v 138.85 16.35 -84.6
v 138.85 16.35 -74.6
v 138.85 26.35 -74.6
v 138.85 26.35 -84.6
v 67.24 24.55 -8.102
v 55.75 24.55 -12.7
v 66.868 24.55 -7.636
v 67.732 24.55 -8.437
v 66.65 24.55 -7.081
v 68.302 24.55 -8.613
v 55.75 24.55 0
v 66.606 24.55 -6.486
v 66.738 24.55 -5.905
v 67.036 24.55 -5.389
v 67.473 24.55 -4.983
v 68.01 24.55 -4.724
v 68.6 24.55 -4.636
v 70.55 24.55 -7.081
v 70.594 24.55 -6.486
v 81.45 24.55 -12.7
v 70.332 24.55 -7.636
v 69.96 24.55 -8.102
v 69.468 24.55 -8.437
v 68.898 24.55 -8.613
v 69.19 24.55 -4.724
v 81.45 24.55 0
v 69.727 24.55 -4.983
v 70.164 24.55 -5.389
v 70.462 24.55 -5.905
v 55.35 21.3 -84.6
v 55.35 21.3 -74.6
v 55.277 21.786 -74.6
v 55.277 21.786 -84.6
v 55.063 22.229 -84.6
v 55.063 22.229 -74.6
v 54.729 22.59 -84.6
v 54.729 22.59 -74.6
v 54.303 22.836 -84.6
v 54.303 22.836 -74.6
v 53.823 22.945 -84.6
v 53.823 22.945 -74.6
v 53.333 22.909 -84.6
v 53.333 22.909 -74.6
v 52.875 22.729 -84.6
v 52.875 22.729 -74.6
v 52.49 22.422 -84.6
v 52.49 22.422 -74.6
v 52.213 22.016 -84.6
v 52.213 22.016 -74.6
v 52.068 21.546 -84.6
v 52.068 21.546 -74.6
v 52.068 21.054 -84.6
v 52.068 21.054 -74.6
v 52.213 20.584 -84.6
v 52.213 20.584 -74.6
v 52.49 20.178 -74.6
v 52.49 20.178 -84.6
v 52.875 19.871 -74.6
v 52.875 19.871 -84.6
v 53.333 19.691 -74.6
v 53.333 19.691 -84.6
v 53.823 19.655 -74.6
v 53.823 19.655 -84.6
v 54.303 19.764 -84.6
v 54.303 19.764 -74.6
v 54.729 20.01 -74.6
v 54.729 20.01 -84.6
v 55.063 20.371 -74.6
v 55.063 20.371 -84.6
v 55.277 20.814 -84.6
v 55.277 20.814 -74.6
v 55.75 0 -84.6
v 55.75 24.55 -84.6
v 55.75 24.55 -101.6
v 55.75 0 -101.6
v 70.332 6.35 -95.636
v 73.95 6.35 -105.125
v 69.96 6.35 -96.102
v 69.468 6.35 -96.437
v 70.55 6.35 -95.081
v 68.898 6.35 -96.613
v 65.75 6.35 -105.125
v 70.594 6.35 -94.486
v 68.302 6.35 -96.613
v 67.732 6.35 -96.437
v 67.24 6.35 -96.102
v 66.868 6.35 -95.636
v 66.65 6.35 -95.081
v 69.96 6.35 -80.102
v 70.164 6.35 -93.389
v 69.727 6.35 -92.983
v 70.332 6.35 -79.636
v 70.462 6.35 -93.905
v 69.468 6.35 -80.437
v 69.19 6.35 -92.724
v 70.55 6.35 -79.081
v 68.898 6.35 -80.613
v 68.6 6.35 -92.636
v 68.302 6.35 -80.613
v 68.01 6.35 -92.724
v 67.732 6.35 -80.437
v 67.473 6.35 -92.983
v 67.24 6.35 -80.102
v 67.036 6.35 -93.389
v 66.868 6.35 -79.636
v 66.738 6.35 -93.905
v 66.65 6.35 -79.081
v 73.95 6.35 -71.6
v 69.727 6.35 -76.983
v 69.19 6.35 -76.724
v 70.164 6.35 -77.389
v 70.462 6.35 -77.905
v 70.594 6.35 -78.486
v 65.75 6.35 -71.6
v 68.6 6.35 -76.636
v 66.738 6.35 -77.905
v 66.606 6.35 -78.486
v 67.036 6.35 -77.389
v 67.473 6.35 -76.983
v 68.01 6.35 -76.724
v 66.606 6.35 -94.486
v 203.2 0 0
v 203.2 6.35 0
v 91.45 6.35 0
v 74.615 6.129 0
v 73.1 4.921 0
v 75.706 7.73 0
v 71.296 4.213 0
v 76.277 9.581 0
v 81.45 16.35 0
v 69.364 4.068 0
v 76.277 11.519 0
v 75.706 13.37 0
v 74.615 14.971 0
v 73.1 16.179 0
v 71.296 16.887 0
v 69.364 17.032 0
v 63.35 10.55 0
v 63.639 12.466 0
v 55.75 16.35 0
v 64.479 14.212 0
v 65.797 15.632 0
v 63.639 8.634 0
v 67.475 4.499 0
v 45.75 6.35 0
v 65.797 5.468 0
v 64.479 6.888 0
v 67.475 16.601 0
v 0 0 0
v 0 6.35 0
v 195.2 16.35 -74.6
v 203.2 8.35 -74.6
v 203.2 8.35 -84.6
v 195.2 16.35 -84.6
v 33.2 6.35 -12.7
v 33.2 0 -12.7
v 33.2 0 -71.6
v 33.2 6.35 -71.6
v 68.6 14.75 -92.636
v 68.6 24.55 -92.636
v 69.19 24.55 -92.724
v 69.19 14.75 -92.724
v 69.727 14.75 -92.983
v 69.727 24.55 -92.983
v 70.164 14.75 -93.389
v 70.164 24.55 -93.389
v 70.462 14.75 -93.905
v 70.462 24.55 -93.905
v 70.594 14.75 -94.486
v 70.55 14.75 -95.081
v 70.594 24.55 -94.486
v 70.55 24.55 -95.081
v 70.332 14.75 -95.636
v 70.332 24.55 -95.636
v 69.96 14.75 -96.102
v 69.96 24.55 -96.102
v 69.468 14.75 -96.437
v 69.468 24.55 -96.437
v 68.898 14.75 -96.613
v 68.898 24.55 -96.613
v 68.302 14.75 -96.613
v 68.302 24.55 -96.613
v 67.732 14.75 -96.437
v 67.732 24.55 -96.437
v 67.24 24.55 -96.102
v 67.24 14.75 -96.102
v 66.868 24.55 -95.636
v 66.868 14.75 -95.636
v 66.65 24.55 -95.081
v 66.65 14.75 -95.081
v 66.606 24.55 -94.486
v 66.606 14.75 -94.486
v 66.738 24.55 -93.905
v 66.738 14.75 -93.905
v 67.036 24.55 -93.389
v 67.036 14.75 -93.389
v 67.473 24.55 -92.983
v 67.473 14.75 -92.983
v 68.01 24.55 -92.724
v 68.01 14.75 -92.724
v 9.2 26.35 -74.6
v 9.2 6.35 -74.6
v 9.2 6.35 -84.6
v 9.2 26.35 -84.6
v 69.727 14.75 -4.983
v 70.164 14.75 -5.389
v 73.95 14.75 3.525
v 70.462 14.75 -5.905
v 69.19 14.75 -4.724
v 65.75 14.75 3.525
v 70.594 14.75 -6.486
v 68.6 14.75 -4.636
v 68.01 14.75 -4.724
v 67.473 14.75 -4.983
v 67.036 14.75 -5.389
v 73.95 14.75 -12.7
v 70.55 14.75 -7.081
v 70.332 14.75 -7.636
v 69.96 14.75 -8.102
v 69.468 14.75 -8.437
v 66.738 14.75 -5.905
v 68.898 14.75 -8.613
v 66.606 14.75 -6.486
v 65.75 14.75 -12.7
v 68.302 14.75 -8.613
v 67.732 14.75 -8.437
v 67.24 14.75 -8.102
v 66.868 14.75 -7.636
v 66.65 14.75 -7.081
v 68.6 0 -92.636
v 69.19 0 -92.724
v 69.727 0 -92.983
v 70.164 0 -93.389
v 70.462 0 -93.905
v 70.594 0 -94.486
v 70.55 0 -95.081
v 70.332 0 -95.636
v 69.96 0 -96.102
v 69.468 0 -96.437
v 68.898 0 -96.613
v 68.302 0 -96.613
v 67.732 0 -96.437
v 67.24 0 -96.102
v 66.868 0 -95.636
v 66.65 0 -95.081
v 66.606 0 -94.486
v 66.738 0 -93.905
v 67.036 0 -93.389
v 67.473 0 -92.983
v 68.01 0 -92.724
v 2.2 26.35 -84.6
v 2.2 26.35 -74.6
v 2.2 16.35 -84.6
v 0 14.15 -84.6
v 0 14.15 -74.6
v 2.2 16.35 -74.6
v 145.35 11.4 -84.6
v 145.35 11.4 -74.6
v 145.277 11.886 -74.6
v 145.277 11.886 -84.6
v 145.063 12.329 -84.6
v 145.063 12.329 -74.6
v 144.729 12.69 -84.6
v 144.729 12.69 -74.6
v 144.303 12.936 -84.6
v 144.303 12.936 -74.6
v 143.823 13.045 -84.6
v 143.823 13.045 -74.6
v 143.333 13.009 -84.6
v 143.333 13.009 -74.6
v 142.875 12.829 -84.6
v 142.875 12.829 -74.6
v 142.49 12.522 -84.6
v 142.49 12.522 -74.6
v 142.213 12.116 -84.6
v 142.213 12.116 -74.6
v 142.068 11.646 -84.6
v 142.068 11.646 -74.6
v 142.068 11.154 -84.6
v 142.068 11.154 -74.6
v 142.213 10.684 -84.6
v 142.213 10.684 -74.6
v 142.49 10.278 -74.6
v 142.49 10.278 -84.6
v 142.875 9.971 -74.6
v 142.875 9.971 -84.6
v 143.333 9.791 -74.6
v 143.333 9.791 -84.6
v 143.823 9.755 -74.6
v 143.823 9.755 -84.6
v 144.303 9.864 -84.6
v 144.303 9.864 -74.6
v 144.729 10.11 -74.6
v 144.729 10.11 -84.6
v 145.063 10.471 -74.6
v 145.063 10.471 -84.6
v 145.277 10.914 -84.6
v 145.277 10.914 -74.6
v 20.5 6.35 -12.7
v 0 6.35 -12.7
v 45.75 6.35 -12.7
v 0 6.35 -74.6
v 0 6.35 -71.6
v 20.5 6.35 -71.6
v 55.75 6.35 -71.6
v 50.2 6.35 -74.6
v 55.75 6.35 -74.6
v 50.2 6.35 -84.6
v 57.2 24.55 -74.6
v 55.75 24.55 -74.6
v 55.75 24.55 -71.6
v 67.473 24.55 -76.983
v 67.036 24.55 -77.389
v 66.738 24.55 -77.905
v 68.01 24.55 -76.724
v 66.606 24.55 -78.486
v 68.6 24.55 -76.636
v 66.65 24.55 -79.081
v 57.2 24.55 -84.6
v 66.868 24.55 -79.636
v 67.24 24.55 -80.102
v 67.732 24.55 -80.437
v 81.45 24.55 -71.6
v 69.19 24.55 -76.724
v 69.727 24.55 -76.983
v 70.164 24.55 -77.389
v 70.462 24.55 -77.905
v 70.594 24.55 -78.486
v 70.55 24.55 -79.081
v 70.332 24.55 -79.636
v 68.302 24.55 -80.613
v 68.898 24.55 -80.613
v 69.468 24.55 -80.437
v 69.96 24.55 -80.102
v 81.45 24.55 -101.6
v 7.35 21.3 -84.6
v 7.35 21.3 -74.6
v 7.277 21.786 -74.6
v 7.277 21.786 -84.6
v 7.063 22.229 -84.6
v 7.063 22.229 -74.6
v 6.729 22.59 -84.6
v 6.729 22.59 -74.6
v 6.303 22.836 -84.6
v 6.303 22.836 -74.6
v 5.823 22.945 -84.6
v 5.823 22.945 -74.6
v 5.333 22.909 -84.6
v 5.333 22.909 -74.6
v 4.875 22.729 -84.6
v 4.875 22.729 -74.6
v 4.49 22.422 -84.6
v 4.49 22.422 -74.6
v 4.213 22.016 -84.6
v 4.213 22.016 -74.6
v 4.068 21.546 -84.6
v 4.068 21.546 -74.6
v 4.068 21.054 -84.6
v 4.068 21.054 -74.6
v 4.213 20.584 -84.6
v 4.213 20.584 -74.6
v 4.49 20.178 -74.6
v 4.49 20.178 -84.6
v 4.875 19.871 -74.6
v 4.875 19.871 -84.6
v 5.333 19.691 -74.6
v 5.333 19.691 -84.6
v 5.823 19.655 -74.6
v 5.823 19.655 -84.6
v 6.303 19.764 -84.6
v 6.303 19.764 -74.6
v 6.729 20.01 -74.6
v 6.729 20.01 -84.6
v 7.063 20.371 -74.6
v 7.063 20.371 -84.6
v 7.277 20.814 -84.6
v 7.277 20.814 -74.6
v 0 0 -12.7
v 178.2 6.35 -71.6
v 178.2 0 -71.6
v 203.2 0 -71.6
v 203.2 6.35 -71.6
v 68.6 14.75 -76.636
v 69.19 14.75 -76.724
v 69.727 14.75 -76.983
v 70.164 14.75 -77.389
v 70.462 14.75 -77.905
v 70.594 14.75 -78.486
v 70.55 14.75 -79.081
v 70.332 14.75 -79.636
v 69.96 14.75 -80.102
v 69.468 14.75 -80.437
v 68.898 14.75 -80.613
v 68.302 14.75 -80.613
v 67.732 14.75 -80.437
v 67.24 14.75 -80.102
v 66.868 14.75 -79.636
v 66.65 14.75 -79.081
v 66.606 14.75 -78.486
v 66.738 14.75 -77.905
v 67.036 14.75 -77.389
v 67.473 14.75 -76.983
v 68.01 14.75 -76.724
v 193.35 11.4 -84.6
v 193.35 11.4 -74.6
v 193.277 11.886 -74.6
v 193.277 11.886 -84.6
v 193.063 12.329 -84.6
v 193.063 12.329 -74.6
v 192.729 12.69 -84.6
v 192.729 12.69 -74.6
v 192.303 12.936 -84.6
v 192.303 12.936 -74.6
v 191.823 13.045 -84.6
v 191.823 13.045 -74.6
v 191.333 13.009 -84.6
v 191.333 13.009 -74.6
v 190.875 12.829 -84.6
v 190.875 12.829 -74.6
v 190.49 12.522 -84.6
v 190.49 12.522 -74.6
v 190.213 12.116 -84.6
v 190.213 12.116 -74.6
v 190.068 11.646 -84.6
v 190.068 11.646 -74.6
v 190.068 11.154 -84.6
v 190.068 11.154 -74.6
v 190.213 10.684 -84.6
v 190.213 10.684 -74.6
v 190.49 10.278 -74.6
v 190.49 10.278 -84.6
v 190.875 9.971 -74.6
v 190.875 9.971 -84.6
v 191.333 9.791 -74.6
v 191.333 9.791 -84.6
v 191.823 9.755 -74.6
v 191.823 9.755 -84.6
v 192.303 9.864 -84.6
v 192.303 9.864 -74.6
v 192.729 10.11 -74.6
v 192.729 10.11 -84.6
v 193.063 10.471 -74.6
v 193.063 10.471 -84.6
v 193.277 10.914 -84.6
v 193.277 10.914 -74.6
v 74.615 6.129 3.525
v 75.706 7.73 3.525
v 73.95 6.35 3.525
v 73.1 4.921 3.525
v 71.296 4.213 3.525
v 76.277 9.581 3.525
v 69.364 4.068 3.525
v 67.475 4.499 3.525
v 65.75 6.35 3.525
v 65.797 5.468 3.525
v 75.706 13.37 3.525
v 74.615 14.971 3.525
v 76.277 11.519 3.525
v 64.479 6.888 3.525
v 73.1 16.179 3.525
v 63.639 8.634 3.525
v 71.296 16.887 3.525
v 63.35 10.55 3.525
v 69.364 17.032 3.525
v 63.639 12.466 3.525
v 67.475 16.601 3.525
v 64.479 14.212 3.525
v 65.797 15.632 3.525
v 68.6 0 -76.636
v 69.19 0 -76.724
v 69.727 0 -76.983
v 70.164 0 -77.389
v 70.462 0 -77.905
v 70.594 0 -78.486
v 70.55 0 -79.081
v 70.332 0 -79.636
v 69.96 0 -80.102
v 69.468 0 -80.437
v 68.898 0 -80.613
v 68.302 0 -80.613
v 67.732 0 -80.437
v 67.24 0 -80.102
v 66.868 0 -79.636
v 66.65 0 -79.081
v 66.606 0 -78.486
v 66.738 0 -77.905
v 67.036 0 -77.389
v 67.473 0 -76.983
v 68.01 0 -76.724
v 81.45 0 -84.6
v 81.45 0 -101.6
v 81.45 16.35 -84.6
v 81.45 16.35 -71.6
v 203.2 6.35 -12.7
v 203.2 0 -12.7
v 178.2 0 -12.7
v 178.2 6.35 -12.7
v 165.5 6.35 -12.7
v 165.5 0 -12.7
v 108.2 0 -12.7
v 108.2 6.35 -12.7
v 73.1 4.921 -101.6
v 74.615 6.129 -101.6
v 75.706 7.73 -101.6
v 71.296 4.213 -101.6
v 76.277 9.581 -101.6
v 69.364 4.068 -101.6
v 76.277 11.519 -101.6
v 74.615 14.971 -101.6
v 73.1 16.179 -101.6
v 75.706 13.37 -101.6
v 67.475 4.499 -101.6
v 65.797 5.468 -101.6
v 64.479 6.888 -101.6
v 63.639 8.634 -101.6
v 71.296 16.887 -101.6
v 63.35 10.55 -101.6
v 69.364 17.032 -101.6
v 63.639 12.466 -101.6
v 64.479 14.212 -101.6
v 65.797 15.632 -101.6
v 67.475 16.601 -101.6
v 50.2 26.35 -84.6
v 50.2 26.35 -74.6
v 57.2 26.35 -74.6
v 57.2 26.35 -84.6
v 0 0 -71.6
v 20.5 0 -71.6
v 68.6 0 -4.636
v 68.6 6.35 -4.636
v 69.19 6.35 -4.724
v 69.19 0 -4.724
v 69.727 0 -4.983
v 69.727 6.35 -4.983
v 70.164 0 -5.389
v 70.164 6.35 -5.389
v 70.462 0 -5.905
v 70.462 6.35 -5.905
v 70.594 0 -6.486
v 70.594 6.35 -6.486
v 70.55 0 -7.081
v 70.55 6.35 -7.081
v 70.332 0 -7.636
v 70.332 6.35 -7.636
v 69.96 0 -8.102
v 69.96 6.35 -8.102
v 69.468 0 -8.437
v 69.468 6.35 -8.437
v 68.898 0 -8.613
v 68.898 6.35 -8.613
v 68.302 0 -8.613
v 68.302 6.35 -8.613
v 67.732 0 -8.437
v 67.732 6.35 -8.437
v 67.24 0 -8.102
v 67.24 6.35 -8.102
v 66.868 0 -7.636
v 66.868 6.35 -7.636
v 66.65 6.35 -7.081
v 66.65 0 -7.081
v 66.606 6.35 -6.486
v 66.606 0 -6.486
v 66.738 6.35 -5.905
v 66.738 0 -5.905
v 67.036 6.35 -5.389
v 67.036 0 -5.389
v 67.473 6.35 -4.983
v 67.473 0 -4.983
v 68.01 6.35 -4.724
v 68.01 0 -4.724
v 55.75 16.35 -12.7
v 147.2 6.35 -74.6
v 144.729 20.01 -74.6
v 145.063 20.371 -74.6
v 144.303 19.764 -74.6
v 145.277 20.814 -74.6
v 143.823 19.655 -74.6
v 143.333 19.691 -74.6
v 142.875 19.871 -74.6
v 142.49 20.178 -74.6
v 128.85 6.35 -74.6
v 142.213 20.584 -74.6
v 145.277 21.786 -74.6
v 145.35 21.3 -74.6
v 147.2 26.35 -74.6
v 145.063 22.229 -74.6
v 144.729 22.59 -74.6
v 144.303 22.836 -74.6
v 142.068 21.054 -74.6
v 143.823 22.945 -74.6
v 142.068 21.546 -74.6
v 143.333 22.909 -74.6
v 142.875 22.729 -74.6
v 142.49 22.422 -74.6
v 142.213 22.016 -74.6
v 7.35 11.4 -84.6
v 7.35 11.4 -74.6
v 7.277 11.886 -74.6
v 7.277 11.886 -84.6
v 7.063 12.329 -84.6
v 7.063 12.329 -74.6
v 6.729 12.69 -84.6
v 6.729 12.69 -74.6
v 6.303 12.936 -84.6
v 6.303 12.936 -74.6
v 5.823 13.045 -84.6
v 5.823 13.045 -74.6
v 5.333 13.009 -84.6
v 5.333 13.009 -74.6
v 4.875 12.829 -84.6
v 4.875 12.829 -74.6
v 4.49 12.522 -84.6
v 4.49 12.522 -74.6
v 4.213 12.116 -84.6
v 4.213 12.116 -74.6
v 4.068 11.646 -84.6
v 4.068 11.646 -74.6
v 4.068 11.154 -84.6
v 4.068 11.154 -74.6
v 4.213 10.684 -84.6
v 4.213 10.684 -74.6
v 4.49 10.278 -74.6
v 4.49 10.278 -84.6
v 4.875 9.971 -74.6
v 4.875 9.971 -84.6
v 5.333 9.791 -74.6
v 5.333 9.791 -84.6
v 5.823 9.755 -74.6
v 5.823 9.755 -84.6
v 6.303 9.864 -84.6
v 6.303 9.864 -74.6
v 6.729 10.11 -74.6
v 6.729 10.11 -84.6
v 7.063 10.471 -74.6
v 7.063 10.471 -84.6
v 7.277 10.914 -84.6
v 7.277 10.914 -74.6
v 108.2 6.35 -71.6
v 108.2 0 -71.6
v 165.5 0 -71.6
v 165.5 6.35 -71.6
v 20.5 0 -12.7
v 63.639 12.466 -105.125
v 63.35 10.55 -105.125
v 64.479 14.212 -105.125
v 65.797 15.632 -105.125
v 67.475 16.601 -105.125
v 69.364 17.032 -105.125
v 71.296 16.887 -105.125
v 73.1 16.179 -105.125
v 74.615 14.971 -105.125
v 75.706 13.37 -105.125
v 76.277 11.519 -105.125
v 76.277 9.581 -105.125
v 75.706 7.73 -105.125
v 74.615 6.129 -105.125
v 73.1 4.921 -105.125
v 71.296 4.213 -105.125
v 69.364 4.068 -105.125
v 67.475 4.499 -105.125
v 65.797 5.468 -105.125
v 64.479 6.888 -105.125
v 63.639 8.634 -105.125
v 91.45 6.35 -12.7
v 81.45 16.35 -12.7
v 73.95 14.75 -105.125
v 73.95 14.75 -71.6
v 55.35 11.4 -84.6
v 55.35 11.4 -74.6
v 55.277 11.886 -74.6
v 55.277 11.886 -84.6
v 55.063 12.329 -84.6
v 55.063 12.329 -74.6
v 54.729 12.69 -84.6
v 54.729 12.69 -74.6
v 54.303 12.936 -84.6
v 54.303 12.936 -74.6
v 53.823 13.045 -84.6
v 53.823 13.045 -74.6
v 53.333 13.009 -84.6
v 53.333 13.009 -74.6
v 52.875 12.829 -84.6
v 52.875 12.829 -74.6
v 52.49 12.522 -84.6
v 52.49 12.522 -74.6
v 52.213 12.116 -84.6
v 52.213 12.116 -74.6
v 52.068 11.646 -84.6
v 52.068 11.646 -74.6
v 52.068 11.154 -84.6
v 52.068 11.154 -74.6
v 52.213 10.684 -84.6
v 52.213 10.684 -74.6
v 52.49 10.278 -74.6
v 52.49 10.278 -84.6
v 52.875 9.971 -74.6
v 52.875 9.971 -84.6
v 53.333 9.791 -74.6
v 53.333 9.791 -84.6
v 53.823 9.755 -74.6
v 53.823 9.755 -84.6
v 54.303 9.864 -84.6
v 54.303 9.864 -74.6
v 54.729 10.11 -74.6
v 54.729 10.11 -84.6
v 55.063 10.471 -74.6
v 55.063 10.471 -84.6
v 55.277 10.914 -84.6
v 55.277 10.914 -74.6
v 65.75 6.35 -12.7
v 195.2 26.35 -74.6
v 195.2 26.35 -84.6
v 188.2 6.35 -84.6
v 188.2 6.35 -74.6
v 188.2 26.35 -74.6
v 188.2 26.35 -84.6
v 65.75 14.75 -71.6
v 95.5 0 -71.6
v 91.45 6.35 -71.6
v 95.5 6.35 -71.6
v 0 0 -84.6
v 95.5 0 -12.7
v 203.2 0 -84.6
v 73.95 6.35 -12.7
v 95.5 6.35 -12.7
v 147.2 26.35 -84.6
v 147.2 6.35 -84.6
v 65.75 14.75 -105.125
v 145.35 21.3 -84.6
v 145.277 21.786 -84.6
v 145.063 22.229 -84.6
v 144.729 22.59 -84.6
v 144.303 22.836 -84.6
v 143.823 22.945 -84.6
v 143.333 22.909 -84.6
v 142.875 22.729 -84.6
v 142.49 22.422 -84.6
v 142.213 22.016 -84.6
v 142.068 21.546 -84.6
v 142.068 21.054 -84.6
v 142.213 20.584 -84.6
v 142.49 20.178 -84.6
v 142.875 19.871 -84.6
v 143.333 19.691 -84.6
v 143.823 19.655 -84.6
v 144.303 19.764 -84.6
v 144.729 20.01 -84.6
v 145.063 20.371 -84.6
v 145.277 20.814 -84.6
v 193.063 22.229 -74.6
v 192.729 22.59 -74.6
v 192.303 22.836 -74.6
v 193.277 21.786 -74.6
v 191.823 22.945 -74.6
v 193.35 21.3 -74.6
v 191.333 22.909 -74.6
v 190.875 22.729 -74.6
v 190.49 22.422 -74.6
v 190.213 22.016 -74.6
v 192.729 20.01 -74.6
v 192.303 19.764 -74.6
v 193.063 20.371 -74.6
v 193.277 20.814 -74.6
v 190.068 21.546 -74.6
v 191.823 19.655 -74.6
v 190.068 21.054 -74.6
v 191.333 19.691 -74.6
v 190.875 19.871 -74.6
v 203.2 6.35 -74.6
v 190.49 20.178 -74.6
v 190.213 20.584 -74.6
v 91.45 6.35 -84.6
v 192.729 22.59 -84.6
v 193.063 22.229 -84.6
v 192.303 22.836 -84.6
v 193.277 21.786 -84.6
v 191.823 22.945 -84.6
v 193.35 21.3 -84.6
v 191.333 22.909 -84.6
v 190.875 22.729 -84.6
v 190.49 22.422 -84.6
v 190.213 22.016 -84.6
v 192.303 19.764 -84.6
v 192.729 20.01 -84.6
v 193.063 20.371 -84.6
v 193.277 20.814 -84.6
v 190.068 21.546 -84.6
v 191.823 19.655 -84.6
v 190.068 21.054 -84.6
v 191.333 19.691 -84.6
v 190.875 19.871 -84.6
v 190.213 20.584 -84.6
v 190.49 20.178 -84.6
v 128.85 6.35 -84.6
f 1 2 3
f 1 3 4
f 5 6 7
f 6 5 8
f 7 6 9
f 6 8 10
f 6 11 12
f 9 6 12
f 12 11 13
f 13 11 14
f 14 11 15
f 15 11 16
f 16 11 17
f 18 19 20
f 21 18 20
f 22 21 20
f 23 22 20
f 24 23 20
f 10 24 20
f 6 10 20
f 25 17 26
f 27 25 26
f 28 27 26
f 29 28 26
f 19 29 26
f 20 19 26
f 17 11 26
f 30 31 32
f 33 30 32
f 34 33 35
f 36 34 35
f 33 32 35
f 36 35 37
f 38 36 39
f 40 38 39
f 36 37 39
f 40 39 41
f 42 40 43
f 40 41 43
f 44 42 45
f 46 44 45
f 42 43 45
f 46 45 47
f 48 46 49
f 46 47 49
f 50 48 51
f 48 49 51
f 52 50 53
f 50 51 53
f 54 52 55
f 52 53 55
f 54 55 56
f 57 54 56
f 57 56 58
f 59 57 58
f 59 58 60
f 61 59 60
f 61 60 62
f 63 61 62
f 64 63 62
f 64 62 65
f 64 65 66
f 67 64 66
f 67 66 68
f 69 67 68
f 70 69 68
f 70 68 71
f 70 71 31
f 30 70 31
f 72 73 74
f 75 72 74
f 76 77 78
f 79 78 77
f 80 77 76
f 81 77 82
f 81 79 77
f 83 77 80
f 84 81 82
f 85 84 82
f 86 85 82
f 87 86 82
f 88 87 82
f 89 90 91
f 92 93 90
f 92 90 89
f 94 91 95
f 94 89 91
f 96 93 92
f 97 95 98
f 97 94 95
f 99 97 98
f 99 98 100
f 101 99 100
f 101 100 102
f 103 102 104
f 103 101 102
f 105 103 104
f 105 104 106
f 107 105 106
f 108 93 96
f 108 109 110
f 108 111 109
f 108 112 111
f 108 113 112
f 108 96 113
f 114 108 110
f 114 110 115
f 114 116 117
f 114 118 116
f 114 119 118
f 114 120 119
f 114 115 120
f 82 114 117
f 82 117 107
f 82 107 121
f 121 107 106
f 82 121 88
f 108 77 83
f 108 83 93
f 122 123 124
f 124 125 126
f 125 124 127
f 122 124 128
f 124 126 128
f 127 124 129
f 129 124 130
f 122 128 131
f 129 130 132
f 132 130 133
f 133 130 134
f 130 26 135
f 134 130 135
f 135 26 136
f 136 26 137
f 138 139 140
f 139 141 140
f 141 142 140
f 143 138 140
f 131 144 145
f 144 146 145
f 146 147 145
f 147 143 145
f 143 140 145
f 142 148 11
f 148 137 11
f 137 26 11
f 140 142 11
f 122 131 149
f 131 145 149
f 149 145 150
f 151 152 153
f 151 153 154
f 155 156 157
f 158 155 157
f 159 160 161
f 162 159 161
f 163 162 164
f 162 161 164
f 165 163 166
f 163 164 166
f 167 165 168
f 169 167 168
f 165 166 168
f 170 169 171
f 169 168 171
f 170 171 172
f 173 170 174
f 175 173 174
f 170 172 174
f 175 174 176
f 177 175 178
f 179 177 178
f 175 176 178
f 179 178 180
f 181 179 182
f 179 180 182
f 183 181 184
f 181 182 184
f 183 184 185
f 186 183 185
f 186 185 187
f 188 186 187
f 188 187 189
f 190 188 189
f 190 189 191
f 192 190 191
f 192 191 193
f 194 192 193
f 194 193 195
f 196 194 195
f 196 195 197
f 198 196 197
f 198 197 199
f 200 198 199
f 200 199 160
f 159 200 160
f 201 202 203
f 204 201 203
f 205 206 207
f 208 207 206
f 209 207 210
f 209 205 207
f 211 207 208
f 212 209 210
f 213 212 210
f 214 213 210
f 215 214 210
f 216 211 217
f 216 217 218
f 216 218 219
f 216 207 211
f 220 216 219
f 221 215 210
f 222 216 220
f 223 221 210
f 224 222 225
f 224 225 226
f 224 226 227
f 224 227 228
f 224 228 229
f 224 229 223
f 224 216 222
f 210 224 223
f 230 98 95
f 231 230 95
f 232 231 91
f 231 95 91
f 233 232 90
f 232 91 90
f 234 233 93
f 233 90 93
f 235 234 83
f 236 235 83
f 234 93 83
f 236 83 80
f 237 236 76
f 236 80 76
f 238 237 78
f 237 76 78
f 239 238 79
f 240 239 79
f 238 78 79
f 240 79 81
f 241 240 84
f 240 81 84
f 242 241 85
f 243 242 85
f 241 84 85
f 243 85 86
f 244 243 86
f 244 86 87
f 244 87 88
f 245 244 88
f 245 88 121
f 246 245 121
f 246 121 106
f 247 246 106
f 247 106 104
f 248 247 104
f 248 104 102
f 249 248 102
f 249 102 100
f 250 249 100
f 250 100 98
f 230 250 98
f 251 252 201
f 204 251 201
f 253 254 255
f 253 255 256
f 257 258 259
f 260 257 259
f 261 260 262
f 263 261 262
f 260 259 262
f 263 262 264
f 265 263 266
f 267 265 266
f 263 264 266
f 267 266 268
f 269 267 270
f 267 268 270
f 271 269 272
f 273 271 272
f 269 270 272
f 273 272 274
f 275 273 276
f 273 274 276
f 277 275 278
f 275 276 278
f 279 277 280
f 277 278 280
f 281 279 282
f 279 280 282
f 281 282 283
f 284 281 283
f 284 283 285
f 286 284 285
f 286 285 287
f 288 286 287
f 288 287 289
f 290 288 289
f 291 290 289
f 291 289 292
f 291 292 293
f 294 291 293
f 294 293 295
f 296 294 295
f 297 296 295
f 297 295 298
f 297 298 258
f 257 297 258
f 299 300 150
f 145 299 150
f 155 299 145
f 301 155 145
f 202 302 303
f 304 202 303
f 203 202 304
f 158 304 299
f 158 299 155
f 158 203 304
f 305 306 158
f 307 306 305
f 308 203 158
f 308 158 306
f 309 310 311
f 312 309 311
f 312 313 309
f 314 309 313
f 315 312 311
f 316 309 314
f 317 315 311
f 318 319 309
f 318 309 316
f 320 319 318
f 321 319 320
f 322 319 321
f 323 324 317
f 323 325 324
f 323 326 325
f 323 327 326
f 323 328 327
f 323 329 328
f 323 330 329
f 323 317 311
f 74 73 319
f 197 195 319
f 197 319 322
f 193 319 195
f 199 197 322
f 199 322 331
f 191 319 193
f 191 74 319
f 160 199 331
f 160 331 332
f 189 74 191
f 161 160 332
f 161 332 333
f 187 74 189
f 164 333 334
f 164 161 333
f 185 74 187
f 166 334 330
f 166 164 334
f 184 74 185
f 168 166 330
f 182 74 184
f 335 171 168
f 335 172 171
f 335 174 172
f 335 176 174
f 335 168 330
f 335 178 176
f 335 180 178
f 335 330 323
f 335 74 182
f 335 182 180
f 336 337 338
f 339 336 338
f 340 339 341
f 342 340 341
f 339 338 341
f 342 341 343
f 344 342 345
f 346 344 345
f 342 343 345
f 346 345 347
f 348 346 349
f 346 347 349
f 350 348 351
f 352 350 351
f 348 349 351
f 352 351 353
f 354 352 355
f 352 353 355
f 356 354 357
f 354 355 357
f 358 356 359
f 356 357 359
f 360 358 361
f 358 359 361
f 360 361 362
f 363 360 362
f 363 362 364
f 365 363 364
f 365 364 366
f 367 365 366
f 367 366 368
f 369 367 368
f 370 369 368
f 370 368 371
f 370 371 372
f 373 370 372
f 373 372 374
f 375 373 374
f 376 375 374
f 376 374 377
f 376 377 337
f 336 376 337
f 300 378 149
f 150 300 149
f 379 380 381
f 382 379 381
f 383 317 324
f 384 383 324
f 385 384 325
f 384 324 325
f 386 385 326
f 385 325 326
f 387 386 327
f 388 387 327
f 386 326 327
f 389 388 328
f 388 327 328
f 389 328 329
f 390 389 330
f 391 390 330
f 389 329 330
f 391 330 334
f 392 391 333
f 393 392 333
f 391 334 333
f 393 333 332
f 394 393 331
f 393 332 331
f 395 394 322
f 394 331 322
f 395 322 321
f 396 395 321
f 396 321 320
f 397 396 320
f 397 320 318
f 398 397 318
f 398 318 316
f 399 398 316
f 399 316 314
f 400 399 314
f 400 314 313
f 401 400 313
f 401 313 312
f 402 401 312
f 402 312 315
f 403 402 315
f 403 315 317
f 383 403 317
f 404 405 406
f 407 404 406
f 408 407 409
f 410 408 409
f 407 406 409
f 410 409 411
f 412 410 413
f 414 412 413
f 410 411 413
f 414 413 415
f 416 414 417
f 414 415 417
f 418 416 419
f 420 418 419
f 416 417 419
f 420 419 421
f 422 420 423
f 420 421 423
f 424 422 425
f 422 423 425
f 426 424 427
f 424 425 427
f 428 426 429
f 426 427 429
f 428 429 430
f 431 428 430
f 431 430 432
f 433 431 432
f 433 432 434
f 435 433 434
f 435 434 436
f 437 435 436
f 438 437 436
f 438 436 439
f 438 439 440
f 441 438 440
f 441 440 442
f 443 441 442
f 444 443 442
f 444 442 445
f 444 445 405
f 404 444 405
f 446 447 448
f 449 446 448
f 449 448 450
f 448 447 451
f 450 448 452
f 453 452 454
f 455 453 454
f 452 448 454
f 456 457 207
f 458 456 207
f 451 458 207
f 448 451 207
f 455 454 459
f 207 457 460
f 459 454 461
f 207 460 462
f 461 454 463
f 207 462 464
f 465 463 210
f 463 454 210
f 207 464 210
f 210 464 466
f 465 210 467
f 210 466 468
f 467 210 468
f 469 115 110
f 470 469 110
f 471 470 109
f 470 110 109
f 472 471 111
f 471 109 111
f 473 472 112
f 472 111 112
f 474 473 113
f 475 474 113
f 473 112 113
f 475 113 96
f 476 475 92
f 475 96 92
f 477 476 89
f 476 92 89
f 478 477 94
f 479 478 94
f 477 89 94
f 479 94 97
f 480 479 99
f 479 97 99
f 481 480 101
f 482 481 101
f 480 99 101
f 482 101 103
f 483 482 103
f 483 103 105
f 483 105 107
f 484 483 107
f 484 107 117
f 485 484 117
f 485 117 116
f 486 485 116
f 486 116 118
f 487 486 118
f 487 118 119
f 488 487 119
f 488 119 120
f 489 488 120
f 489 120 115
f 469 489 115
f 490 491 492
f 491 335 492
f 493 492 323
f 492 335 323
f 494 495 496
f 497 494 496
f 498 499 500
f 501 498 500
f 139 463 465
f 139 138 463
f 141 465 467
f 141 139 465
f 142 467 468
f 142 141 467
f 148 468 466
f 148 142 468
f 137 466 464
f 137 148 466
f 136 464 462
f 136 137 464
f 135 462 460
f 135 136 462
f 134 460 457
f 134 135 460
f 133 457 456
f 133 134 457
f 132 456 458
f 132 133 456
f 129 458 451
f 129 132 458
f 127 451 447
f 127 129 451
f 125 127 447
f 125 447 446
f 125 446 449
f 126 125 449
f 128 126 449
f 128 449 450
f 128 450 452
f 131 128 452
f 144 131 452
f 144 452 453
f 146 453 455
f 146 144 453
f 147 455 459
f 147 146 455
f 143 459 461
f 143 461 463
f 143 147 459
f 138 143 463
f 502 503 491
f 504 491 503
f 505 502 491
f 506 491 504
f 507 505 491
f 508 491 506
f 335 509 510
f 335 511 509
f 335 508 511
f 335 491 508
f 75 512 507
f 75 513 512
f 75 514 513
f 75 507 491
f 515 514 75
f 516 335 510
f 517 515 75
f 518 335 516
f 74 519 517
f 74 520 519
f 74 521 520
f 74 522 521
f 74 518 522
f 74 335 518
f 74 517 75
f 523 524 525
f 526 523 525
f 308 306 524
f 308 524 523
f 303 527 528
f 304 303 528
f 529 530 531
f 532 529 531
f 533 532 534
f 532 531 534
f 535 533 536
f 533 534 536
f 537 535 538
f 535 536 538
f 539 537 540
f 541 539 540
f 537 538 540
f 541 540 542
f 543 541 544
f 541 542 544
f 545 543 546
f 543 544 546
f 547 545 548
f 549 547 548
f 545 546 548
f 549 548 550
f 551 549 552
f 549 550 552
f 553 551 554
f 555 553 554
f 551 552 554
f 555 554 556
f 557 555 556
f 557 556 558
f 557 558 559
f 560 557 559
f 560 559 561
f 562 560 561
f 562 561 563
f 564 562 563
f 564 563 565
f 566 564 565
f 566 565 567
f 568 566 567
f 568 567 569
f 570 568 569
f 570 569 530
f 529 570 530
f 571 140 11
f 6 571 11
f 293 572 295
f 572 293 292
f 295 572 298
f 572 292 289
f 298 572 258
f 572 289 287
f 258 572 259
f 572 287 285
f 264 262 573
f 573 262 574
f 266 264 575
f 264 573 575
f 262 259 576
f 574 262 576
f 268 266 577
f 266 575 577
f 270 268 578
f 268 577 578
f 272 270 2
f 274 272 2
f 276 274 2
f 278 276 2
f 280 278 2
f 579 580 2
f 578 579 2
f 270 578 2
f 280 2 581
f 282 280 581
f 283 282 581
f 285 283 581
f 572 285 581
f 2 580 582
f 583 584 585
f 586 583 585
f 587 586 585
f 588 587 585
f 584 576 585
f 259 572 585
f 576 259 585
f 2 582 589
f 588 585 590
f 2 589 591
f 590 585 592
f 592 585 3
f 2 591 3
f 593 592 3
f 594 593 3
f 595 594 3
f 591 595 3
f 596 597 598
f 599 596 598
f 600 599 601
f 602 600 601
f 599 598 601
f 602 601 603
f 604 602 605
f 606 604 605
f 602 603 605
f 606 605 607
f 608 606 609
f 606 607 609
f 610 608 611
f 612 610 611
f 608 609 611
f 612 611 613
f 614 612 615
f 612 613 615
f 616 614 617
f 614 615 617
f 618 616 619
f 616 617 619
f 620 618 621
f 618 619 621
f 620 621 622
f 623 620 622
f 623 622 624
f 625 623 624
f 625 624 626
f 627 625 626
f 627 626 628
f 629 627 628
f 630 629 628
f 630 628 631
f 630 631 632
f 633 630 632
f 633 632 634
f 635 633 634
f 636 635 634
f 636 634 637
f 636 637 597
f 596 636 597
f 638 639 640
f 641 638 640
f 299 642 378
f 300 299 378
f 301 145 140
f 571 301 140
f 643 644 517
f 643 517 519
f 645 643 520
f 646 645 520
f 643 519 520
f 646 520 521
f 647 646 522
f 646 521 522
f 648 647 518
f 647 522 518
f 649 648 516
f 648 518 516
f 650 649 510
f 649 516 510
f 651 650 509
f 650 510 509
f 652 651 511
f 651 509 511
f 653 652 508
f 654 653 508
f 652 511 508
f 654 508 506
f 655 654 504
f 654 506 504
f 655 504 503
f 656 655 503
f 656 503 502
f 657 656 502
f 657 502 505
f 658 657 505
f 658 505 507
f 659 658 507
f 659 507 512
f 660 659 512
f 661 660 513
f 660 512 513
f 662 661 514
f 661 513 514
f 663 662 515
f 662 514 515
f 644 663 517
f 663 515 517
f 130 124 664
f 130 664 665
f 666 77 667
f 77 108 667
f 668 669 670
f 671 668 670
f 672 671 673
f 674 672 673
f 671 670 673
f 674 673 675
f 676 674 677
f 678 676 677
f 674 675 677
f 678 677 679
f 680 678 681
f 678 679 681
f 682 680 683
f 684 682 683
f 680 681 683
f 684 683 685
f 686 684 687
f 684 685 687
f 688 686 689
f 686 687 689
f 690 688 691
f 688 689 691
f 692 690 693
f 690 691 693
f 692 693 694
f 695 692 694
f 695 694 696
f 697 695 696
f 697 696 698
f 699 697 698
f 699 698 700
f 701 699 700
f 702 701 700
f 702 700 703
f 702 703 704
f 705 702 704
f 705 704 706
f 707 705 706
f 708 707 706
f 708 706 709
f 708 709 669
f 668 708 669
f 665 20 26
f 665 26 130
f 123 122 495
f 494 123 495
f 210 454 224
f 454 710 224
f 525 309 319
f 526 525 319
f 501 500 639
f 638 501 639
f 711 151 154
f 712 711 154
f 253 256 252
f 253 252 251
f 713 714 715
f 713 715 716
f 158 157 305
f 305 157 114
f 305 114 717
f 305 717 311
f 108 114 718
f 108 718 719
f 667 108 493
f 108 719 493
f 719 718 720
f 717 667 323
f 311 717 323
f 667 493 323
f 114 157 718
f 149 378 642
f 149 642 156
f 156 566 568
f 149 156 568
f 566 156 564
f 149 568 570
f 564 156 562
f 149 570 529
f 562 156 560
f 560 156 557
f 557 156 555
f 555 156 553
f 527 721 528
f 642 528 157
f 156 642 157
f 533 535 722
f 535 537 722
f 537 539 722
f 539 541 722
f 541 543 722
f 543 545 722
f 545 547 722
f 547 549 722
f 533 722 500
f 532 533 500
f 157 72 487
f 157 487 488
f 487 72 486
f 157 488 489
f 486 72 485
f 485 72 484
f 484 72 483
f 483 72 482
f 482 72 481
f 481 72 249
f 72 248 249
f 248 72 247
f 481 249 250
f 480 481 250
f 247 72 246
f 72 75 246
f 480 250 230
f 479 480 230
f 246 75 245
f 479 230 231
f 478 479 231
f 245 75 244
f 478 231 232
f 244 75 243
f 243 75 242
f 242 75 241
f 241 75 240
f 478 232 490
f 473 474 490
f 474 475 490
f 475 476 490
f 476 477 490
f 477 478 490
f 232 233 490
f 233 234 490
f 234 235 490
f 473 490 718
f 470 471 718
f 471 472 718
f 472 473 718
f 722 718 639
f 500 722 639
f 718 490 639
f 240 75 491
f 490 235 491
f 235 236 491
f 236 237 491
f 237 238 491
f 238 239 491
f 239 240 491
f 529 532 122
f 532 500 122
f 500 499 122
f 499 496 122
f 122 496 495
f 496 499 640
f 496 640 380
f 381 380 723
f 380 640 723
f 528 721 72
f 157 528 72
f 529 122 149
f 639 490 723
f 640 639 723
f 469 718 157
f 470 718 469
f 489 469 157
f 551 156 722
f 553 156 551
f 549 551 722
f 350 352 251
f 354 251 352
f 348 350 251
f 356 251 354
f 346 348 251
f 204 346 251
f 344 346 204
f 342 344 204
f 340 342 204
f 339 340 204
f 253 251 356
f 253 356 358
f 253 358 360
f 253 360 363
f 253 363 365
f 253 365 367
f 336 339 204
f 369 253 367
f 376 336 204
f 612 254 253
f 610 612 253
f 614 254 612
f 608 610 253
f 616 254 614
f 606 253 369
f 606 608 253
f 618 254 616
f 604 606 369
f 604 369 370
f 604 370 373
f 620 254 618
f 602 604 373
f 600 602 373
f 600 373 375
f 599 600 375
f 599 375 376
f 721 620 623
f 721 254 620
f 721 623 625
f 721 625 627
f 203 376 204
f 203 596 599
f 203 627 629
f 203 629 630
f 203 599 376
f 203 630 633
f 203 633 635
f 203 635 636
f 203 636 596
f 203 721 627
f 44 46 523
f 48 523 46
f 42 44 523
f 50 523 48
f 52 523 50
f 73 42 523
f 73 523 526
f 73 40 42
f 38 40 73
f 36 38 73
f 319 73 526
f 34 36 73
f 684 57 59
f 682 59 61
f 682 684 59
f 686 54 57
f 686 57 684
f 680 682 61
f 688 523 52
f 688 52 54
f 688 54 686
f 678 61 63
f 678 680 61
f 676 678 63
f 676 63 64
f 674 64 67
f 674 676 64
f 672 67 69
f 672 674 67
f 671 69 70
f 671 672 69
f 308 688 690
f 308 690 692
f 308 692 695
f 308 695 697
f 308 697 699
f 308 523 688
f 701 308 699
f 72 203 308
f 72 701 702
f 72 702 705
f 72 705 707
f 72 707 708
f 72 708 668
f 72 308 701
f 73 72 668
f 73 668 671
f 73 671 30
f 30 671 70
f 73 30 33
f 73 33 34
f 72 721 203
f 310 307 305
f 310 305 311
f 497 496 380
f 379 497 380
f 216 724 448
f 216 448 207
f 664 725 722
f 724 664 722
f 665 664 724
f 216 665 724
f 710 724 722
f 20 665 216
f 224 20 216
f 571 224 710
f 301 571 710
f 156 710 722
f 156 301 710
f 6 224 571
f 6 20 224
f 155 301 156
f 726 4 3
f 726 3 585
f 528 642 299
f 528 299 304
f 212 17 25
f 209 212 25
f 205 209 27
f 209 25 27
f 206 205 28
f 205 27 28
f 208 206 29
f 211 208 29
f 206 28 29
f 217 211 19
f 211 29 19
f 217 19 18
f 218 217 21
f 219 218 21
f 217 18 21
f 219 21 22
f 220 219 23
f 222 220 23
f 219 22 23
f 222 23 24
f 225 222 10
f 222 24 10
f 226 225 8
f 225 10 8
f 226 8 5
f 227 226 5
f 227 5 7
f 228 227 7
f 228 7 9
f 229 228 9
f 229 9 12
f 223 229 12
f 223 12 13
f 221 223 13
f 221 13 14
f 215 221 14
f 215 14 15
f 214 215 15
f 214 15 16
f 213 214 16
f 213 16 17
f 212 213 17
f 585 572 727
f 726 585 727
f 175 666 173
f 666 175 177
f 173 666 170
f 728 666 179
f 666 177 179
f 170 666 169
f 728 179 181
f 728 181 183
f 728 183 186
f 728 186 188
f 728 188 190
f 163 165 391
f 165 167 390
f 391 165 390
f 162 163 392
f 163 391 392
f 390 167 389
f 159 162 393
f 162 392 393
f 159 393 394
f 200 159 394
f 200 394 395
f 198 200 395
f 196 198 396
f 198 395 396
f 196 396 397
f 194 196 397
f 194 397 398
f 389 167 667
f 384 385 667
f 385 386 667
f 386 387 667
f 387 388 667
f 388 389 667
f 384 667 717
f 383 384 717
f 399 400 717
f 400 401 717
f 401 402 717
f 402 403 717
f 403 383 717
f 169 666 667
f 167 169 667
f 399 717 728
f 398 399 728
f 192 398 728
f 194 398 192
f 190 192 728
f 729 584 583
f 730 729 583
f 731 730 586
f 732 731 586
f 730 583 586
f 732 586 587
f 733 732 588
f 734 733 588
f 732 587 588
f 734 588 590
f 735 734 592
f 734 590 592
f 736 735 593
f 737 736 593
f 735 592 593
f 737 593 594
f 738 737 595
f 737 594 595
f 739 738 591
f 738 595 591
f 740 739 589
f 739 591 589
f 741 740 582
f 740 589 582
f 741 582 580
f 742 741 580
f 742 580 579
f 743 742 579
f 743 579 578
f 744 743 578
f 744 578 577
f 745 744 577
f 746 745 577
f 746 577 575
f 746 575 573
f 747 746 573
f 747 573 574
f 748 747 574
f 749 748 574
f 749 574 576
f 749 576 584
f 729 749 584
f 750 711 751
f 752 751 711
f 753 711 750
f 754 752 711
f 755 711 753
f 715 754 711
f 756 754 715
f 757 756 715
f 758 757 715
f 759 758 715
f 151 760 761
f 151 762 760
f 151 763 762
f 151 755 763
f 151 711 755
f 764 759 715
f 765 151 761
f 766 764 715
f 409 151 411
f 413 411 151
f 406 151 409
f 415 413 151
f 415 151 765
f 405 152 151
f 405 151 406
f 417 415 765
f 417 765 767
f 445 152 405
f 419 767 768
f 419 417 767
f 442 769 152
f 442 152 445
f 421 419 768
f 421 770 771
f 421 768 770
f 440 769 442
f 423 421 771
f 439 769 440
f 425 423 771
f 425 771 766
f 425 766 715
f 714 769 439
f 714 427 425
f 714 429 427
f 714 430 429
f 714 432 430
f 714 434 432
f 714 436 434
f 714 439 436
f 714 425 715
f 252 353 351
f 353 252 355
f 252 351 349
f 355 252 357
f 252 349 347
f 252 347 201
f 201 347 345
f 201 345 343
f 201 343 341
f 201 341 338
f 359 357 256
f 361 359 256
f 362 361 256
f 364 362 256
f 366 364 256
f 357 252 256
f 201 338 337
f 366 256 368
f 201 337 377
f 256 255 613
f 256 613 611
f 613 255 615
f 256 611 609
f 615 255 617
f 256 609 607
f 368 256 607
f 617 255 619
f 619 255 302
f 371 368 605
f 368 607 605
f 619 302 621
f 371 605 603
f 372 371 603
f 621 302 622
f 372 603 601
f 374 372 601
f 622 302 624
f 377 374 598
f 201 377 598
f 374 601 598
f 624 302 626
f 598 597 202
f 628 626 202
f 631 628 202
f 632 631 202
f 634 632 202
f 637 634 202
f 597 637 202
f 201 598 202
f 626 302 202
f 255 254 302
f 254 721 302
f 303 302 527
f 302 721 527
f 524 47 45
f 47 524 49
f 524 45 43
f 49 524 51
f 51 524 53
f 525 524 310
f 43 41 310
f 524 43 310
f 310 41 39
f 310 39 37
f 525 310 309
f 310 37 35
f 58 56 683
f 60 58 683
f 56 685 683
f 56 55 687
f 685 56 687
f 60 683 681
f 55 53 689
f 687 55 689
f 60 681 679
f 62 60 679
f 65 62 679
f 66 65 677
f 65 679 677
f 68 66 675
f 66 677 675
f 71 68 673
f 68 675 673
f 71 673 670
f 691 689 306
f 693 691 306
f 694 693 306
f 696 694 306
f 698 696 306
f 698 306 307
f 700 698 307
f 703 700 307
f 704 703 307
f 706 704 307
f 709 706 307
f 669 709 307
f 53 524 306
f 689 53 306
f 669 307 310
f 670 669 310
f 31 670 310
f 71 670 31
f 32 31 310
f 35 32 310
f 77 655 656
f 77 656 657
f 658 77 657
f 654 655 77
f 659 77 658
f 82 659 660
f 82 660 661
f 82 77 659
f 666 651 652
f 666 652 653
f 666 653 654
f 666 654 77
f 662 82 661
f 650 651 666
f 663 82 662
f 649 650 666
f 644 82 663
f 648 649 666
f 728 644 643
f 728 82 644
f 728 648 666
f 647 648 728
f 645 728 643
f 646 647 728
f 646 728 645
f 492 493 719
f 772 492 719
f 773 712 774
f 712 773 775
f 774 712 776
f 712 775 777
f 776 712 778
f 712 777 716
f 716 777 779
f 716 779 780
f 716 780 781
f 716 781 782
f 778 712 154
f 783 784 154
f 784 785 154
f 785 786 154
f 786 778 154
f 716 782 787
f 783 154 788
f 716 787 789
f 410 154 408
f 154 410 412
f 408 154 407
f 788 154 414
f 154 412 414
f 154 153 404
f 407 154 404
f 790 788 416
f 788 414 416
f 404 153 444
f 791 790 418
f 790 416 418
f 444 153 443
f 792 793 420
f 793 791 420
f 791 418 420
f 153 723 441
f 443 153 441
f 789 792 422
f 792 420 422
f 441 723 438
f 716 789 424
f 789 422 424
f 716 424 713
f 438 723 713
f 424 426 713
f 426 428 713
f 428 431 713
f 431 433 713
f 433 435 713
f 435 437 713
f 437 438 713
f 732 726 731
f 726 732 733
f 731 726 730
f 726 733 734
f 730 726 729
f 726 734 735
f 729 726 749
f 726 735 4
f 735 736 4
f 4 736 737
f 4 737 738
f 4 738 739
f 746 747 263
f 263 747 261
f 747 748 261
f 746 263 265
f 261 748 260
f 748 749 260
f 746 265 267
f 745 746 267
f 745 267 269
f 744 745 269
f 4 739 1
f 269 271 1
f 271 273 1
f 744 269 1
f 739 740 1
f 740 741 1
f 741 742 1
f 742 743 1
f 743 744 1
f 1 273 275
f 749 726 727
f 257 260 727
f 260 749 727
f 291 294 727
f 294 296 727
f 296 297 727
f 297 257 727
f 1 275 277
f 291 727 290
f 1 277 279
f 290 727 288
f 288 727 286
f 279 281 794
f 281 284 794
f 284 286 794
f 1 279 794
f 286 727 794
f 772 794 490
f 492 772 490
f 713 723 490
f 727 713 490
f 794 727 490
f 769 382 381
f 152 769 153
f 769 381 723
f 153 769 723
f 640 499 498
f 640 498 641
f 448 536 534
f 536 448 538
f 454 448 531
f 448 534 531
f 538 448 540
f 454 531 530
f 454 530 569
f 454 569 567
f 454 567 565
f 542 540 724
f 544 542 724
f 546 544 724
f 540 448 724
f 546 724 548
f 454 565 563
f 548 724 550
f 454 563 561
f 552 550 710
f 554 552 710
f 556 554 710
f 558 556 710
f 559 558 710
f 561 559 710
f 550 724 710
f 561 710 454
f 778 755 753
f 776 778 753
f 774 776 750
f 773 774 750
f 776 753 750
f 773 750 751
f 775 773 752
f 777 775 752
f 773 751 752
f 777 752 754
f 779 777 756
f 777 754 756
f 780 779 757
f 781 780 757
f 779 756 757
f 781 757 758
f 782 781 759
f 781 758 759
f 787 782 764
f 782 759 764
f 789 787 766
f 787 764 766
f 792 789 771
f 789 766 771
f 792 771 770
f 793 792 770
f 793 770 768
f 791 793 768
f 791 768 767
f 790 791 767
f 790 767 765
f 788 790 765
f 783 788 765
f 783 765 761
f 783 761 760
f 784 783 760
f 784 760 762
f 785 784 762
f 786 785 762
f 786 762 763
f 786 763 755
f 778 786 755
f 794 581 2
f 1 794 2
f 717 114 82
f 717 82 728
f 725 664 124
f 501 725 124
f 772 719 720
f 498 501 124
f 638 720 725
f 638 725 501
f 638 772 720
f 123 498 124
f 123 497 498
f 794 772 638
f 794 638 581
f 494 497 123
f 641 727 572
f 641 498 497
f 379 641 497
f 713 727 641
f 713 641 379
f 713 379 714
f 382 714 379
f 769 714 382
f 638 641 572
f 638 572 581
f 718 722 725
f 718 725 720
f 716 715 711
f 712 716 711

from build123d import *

# Parameters (mm, degrees)
SKETCH1_W           = 12.7
SKETCH1_H           = 58.9
BOSS_EXTRUDE1_DEPTH = 6.35
SKETCH6_W           = 16.7
SKETCH6_H           = 10
SKETCH6_W_2         = 7
SKETCH6_W_3         = 8.35
BOSS_EXTRUDE5_DEPTH = 20
FILLET6_SIZE        = 8
FILLET6_SIZE_2      = 20
SKETCH7_R           = 1.65
CUT_EXTRUDE1_DEPTH  = 219.058988591
BOSS_EXTRUDE6_DEPTH = 30
SKETCH10_W          = 25.7
SKETCH10_H          = 17.3
CUT_EXTRUDE2_DEPTH  = 229.063149203
SKETCH11_R          = 6.5
SKETCH11_W          = 8.2
SKETCH11_H          = 8.4
BOSS_EXTRUDE7_DEPTH = 2
SKETCH12_R          = 6.5
SKETCH12_W          = 8.2
SKETCH12_H          = 8.4
BOSS_EXTRUDE8_DEPTH = 1.525
SKETCH14_W          = 8.05
SKETCH14_H          = 18
SKETCH14_W_2        = 8.35
SKETCH14_H_2        = 10
CUT_EXTRUDE4_DEPTH  = 230.655188552
CUT_EXTRUDE5_DEPTH  = 230.655188544
SKETCH17_R          = 2
CUT_EXTRUDE6_DEPTH  = 231.096084549
CHAMFER1_SIZE       = 10


with BuildPart() as part:
    # Sketch1 → Boss-Extrude1 (new body)
    with BuildSketch(Plane(origin=(0, 0, 0), x_dir=(1, 0, 0), z_dir=(0, 1, 0))):
        Polygon((0, 101.6), (0, 71.6), (20.5, 71.6), (33.2, 71.6), (95.5, 71.6), (108.2, 71.6), (165.5, 71.6), (178.2, 71.6), (203.2, 71.6), (203.2, 101.6), align=None)
        with Locations((26.85, 42.15)):
            Rectangle(SKETCH1_W, SKETCH1_H)
        with Locations((101.85, 42.15)):
            Rectangle(SKETCH1_W, SKETCH1_H)
        with Locations((171.85, 42.15)):
            Rectangle(SKETCH1_W, SKETCH1_H)
        Polygon((20.5, 12.7), (0, 12.7), (0, 0), (203.2, 0), (203.2, 12.7), (178.2, 12.7), (165.5, 12.7), (108.2, 12.7), (95.5, 12.7), (33.2, 12.7), align=None)
    extrude(amount=BOSS_EXTRUDE1_DEPTH)

    # Sketch6 → Boss-Extrude5 (add)
    with BuildSketch(Plane(origin=(0, 6.35, 0), x_dir=(1, 0, 0), z_dir=(0, 1, 0))):
        with Locations((138.85, 79.6)):
            Rectangle(SKETCH6_W, SKETCH6_H)
        with Locations((191.7, 79.6)):
            Rectangle(SKETCH6_W_2, SKETCH6_H)
        with Locations((134.675, 79.6)):
            Rectangle(SKETCH6_W_3, SKETCH6_H)
        with Locations((86, 79.6)):
            Rectangle(SKETCH6_W_2, SKETCH6_H)
        with Locations((53.7, 79.6)):
            Rectangle(SKETCH6_W_2, SKETCH6_H)
        with Locations((5.7, 79.6)):
            Rectangle(SKETCH6_W_2, SKETCH6_H)
    extrude(amount=BOSS_EXTRUDE5_DEPTH)

    # Fillet6
    # an asymmetric fillet: 20, 8 mm, written as the material it adds along each edge
    with BuildSketch(Plane(origin=(82.5, 6.35, -84.6), x_dir=(-1, 0, 0), z_dir=(0, 0, 1))) as fillet6_piece_1:
        with BuildLine():
            Bezier((FILLET6_SIZE, 0), (0, 0), (0, -FILLET6_SIZE_2), weights=[1, 0.707106781, 1])
            Line((0, -FILLET6_SIZE_2), (-0.4, -20))
            Line((-0.4, -20), (-0.4, 0.4))
            Line((-0.4, 0.4), (8, 0.4))
            Line((8, 0.4), (FILLET6_SIZE, 0))
        make_face()
    extrude(amount=10)
    with BuildSketch(Plane(origin=(89.5, 6.35, -84.6), x_dir=(0, 0, -1), z_dir=(-1, 0, 0))) as fillet6_piece_2:
        with BuildLine():
            Bezier((FILLET6_SIZE, 0), (0, 0), (0, -FILLET6_SIZE_2), weights=[1, 0.707106781, 1])
            Line((0, -FILLET6_SIZE_2), (-0.4, -20))
            Line((-0.4, -20), (-0.4, 0.4))
            Line((-0.4, 0.4), (8, 0.4))
            Line((8, 0.4), (FILLET6_SIZE, 0))
        make_face()
    extrude(amount=7)
    with BuildSketch(Plane(origin=(89.5, 6.35, -84.6), x_dir=(0, 0, -1), z_dir=(-1, 0, 0))) as fillet6_piece_3a_section:
        with BuildLine():
            Bezier((FILLET6_SIZE, 0), (0, 0), (0, -FILLET6_SIZE_2), weights=[1, 0.707106781, 1])
            Line((0, -FILLET6_SIZE_2), (-0.4, -20))
            Line((-0.4, -20), (-0.4, 0.4))
            Line((-0.4, 0.4), (8, 0.4))
            Line((8, 0.4), (FILLET6_SIZE, 0))
        make_face()
    fillet6_piece_3a = extrude(amount=57, mode=Mode.PRIVATE)
    fillet6_piece_3a = split(fillet6_piece_3a, bisect_by=Plane(origin=(82.5, 11.442766382, -86.187108648), z_dir=(-1, 0, 0)), keep=Keep.TOP, mode=Mode.PRIVATE)
    with BuildSketch(Plane(origin=(82.5, 6.35, -134.6), x_dir=(-1, 0, 0), z_dir=(0, 0, 1))) as fillet6_piece_3b_section:
        with BuildLine():
            Bezier((FILLET6_SIZE, 0), (0, 0), (0, -FILLET6_SIZE_2), weights=[1, 0.707106781, 1])
            Line((0, -FILLET6_SIZE_2), (-0.4, -20))
            Line((-0.4, -20), (-0.4, 0.4))
            Line((-0.4, 0.4), (8, 0.4))
            Line((8, 0.4), (FILLET6_SIZE, 0))
        make_face()
    fillet6_piece_3b = extrude(amount=60, mode=Mode.PRIVATE)
    fillet6_piece_3b = split(fillet6_piece_3b, bisect_by=Plane(origin=(80.912890407, 11.442765861, -84.6), z_dir=(0, 0, -1)), keep=Keep.TOP, mode=Mode.PRIVATE)
    fillet6_piece_3 = fillet6_piece_3a & fillet6_piece_3b
    add(fillet6_piece_3)

    # Sketch7 → Cut-Extrude1 (cut, through all)
    with BuildSketch(Plane.XY.offset(-74.6)):
        with Locations((191.7, 21.3)):
            Circle(SKETCH7_R)
        with Locations((191.7, 11.4)):
            Circle(SKETCH7_R)
        with Locations((143.7, 11.4)):
            Circle(SKETCH7_R)
        with Locations((143.7, 21.3)):
            Circle(SKETCH7_R)
        with Locations((86, 21.3)):
            Circle(SKETCH7_R)
        with Locations((86, 11.4)):
            Circle(SKETCH7_R)
        with Locations((134, 21.3)):
            Circle(SKETCH7_R)
        with Locations((134, 11.4)):
            Circle(SKETCH7_R)
        with Locations((5.7, 21.3)):
            Circle(SKETCH7_R)
        with Locations((5.7, 11.4)):
            Circle(SKETCH7_R)
        with Locations((53.7, 11.4)):
            Circle(SKETCH7_R)
        with Locations((53.7, 21.3)):
            Circle(SKETCH7_R)
    extrude(amount=-CUT_EXTRUDE1_DEPTH, mode=Mode.SUBTRACT)

    # Sketch9 → Boss-Extrude6 (add)
    with BuildSketch(Plane(origin=(0, 0, -101.6), x_dir=(-1, 0, 0), z_dir=(0, 0, -1))):
        Polygon((-73.95, 6.35), (-73.95, 14.75), (-65.75, 14.75), (-65.75, 6.35), (-55.75, 6.35), (-55.75, 24.55), (-81.45, 24.55), (-81.45, 6.35), align=None)
    boss_extrude6 = extrude(amount=-BOSS_EXTRUDE6_DEPTH)

    # Mirror1: Boss-Extrude6 across plane
    add(boss_extrude6.mirror(Plane(origin=(0, 0, -50.8), x_dir=(1, 0, 0), z_dir=(0, 0, -1))))

    # Sketch10 → Cut-Extrude2 (cut, through all)
    with BuildSketch(Plane(origin=(0, 6.35, 0), x_dir=(-1, 0, 0), z_dir=(0, -1, 0))):
        with Locations((-68.6, 21.35)):
            Rectangle(SKETCH10_W, SKETCH10_H)
    extrude(amount=-CUT_EXTRUDE2_DEPTH, mode=Mode.SUBTRACT)

    # Sketch11 → Boss-Extrude7 (add)
    with BuildSketch(Plane(origin=(0, 0, -101.6), x_dir=(-1, 0, 0), z_dir=(0, 0, -1))):
        with Locations((-69.85, 10.55)):
            Circle(SKETCH11_R)
        with Locations((-69.85, 10.55)):
            Rectangle(SKETCH11_W, SKETCH11_H, mode=Mode.SUBTRACT)
    boss_extrude7 = extrude(amount=BOSS_EXTRUDE7_DEPTH)

    # Sketch12 → Boss-Extrude8 (add)
    with BuildSketch(Plane(origin=(0, 0, -103.6), x_dir=(-1, 0, 0), z_dir=(0, 0, -1))):
        with Locations((-69.85, 10.55)):
            Circle(SKETCH12_R)
        with Locations((-69.85, 10.55)):
            Rectangle(SKETCH12_W, SKETCH12_H, mode=Mode.SUBTRACT)
    boss_extrude8 = extrude(amount=BOSS_EXTRUDE8_DEPTH)

    # Mirror2: Boss-Extrude7, Boss-Extrude8 across plane
    add(boss_extrude7.mirror(Plane(origin=(0, 0, -50.8), x_dir=(1, 0, 0), z_dir=(0, 0, -1))))
    add(boss_extrude8.mirror(Plane(origin=(0, 0, -50.8), x_dir=(1, 0, 0), z_dir=(0, 0, -1))))

    # Sketch14 → Cut-Extrude4 (cut, through all)
    with BuildSketch(Plane(origin=(0, 6.35, 0), x_dir=(1, 0, 0), z_dir=(0, 1, 0))):
        with Locations((85.475, 83.6)):
            Rectangle(SKETCH14_W, SKETCH14_H)
        with Locations((134.675, 79.6)):
            Rectangle(SKETCH14_W_2, SKETCH14_H_2)
    extrude(amount=CUT_EXTRUDE4_DEPTH, mode=Mode.SUBTRACT)

    # Sketch15 → Cut-Extrude5 (cut, through all)
    with BuildSketch(Plane(origin=(0, 6.35, 0), x_dir=(1, 0, 0), z_dir=(0, 1, 0))):
        Polygon((188.2, 84.6), (195.2, 84.6), (203.2, 84.6), (203.2, 101.6), (81.45, 101.6), (81.45, 84.6), (138.85, 84.6), (147.2, 84.6), align=None)
        Polygon((0, 101.6), (0, 84.6), (57.2, 84.6), (55.75, 84.6), (55.75, 101.6), align=None)
    extrude(amount=-CUT_EXTRUDE5_DEPTH, mode=Mode.SUBTRACT)

    # Sketch17 → Cut-Extrude6 (cut, through all)
    with BuildSketch(Plane(origin=(0, 24.55, 0), x_dir=(1, 0, 0), z_dir=(0, 1, 0))):
        with Locations(Location((68.6, 6.6355, 0), (0, 0, 270))):
            Circle(SKETCH17_R)
        with Locations(Location((68.6, 78.6355, 0), (0, 0, 270))):
            Circle(SKETCH17_R)
        with Locations(Location((68.6, 94.6355, 0), (0, 0, 270))):
            Circle(SKETCH17_R)
    extrude(amount=-CUT_EXTRUDE6_DEPTH, mode=Mode.SUBTRACT)

    # Chamfer1
    # the kernel refuses this chamfer: 10 mm, written as the material it adds along each edge
    with BuildSketch(Plane(origin=(2.2, 6.35, -84.6), x_dir=(-0.9996219169112968, -0.027495876610586386, 0), z_dir=(0, 0, 1))) as chamfer1_piece_1_section:
        Polygon((CHAMFER1_SIZE * 0.999621916911, -CHAMFER1_SIZE * 0.0274958766106), (-CHAMFER1_SIZE * 0.0274958766106, -CHAMFER1_SIZE * 0.999621916911), (0, 0), align=None)
    chamfer1_piece_1 = extrude(amount=10, mode=Mode.PRIVATE)
    chamfer1_piece_1 = split(chamfer1_piece_1, bisect_by=Plane(origin=(0, 10.91513357, -79.6), z_dir=(1, 0, 0)), keep=Keep.TOP, mode=Mode.PRIVATE)
    add(chamfer1_piece_1)
    with BuildSketch(Plane(origin=(81.45, 6.35, -71.6), x_dir=(-0.027495876610586313, 0.9996219169112968, 0), z_dir=(0, 0, -1))) as chamfer1_piece_2:
        Polygon((CHAMFER1_SIZE * 0.999621916911, CHAMFER1_SIZE * 0.0274958766106), (-CHAMFER1_SIZE * 0.0274958766106, CHAMFER1_SIZE * 0.999621916911), (0, 0), align=None)
    extrude(amount=13)
    with BuildSketch(Plane(origin=(81.45, 6.35, 0), x_dir=(0.9996219169112968, -0.027495876610586403, 0), z_dir=(0, 0, -1))) as chamfer1_piece_3:
        Polygon((CHAMFER1_SIZE * 0.999621916911, -CHAMFER1_SIZE * 0.0274958766106), (-CHAMFER1_SIZE * 0.0274958766106, -CHAMFER1_SIZE * 0.999621916911), (0, 0), align=None)
    extrude(amount=12.7)
    with BuildSketch(Plane(origin=(55.75, 6.35, 0), x_dir=(-0.9996219169112968, -0.027495876610586403, 0), z_dir=(0, 0, -1))) as chamfer1_piece_4:
        Polygon((CHAMFER1_SIZE * 0.999621916911, CHAMFER1_SIZE * 0.0274958766106), (-CHAMFER1_SIZE * 0.0274958766106, CHAMFER1_SIZE * 0.999621916911), (0, 0), align=None)
    extrude(amount=12.7)
    with BuildSketch(Plane(origin=(138.85, 6.35, -74.6), x_dir=(-0.9996219169112968, -0.027495876610586365, 0), z_dir=(0, 0, -1))) as chamfer1_piece_5:
        Polygon((CHAMFER1_SIZE * 0.999621916911, CHAMFER1_SIZE * 0.0274958766106), (-CHAMFER1_SIZE * 0.0274958766106, CHAMFER1_SIZE * 0.999621916911), (0, 0), align=None)
    extrude(amount=10)
    with BuildSketch(Plane(origin=(195.2, 6.35, -74.6), x_dir=(0.9996219169112968, -0.027495876610586365, 0), z_dir=(0, 0, -1))) as chamfer1_piece_6_section:
        Polygon((CHAMFER1_SIZE * 0.999621916911, -CHAMFER1_SIZE * 0.0274958766106), (-CHAMFER1_SIZE * 0.0274958766106, -CHAMFER1_SIZE * 0.999621916911), (0, 0), align=None)
    chamfer1_piece_6 = extrude(amount=10, mode=Mode.PRIVATE)
    chamfer1_piece_6 = split(chamfer1_piece_6, bisect_by=Plane(origin=(203.2, 9.807184123, -79.6), z_dir=(-1, 0, 0)), keep=Keep.TOP, mode=Mode.PRIVATE)
    add(chamfer1_piece_6)


solid = part.part
